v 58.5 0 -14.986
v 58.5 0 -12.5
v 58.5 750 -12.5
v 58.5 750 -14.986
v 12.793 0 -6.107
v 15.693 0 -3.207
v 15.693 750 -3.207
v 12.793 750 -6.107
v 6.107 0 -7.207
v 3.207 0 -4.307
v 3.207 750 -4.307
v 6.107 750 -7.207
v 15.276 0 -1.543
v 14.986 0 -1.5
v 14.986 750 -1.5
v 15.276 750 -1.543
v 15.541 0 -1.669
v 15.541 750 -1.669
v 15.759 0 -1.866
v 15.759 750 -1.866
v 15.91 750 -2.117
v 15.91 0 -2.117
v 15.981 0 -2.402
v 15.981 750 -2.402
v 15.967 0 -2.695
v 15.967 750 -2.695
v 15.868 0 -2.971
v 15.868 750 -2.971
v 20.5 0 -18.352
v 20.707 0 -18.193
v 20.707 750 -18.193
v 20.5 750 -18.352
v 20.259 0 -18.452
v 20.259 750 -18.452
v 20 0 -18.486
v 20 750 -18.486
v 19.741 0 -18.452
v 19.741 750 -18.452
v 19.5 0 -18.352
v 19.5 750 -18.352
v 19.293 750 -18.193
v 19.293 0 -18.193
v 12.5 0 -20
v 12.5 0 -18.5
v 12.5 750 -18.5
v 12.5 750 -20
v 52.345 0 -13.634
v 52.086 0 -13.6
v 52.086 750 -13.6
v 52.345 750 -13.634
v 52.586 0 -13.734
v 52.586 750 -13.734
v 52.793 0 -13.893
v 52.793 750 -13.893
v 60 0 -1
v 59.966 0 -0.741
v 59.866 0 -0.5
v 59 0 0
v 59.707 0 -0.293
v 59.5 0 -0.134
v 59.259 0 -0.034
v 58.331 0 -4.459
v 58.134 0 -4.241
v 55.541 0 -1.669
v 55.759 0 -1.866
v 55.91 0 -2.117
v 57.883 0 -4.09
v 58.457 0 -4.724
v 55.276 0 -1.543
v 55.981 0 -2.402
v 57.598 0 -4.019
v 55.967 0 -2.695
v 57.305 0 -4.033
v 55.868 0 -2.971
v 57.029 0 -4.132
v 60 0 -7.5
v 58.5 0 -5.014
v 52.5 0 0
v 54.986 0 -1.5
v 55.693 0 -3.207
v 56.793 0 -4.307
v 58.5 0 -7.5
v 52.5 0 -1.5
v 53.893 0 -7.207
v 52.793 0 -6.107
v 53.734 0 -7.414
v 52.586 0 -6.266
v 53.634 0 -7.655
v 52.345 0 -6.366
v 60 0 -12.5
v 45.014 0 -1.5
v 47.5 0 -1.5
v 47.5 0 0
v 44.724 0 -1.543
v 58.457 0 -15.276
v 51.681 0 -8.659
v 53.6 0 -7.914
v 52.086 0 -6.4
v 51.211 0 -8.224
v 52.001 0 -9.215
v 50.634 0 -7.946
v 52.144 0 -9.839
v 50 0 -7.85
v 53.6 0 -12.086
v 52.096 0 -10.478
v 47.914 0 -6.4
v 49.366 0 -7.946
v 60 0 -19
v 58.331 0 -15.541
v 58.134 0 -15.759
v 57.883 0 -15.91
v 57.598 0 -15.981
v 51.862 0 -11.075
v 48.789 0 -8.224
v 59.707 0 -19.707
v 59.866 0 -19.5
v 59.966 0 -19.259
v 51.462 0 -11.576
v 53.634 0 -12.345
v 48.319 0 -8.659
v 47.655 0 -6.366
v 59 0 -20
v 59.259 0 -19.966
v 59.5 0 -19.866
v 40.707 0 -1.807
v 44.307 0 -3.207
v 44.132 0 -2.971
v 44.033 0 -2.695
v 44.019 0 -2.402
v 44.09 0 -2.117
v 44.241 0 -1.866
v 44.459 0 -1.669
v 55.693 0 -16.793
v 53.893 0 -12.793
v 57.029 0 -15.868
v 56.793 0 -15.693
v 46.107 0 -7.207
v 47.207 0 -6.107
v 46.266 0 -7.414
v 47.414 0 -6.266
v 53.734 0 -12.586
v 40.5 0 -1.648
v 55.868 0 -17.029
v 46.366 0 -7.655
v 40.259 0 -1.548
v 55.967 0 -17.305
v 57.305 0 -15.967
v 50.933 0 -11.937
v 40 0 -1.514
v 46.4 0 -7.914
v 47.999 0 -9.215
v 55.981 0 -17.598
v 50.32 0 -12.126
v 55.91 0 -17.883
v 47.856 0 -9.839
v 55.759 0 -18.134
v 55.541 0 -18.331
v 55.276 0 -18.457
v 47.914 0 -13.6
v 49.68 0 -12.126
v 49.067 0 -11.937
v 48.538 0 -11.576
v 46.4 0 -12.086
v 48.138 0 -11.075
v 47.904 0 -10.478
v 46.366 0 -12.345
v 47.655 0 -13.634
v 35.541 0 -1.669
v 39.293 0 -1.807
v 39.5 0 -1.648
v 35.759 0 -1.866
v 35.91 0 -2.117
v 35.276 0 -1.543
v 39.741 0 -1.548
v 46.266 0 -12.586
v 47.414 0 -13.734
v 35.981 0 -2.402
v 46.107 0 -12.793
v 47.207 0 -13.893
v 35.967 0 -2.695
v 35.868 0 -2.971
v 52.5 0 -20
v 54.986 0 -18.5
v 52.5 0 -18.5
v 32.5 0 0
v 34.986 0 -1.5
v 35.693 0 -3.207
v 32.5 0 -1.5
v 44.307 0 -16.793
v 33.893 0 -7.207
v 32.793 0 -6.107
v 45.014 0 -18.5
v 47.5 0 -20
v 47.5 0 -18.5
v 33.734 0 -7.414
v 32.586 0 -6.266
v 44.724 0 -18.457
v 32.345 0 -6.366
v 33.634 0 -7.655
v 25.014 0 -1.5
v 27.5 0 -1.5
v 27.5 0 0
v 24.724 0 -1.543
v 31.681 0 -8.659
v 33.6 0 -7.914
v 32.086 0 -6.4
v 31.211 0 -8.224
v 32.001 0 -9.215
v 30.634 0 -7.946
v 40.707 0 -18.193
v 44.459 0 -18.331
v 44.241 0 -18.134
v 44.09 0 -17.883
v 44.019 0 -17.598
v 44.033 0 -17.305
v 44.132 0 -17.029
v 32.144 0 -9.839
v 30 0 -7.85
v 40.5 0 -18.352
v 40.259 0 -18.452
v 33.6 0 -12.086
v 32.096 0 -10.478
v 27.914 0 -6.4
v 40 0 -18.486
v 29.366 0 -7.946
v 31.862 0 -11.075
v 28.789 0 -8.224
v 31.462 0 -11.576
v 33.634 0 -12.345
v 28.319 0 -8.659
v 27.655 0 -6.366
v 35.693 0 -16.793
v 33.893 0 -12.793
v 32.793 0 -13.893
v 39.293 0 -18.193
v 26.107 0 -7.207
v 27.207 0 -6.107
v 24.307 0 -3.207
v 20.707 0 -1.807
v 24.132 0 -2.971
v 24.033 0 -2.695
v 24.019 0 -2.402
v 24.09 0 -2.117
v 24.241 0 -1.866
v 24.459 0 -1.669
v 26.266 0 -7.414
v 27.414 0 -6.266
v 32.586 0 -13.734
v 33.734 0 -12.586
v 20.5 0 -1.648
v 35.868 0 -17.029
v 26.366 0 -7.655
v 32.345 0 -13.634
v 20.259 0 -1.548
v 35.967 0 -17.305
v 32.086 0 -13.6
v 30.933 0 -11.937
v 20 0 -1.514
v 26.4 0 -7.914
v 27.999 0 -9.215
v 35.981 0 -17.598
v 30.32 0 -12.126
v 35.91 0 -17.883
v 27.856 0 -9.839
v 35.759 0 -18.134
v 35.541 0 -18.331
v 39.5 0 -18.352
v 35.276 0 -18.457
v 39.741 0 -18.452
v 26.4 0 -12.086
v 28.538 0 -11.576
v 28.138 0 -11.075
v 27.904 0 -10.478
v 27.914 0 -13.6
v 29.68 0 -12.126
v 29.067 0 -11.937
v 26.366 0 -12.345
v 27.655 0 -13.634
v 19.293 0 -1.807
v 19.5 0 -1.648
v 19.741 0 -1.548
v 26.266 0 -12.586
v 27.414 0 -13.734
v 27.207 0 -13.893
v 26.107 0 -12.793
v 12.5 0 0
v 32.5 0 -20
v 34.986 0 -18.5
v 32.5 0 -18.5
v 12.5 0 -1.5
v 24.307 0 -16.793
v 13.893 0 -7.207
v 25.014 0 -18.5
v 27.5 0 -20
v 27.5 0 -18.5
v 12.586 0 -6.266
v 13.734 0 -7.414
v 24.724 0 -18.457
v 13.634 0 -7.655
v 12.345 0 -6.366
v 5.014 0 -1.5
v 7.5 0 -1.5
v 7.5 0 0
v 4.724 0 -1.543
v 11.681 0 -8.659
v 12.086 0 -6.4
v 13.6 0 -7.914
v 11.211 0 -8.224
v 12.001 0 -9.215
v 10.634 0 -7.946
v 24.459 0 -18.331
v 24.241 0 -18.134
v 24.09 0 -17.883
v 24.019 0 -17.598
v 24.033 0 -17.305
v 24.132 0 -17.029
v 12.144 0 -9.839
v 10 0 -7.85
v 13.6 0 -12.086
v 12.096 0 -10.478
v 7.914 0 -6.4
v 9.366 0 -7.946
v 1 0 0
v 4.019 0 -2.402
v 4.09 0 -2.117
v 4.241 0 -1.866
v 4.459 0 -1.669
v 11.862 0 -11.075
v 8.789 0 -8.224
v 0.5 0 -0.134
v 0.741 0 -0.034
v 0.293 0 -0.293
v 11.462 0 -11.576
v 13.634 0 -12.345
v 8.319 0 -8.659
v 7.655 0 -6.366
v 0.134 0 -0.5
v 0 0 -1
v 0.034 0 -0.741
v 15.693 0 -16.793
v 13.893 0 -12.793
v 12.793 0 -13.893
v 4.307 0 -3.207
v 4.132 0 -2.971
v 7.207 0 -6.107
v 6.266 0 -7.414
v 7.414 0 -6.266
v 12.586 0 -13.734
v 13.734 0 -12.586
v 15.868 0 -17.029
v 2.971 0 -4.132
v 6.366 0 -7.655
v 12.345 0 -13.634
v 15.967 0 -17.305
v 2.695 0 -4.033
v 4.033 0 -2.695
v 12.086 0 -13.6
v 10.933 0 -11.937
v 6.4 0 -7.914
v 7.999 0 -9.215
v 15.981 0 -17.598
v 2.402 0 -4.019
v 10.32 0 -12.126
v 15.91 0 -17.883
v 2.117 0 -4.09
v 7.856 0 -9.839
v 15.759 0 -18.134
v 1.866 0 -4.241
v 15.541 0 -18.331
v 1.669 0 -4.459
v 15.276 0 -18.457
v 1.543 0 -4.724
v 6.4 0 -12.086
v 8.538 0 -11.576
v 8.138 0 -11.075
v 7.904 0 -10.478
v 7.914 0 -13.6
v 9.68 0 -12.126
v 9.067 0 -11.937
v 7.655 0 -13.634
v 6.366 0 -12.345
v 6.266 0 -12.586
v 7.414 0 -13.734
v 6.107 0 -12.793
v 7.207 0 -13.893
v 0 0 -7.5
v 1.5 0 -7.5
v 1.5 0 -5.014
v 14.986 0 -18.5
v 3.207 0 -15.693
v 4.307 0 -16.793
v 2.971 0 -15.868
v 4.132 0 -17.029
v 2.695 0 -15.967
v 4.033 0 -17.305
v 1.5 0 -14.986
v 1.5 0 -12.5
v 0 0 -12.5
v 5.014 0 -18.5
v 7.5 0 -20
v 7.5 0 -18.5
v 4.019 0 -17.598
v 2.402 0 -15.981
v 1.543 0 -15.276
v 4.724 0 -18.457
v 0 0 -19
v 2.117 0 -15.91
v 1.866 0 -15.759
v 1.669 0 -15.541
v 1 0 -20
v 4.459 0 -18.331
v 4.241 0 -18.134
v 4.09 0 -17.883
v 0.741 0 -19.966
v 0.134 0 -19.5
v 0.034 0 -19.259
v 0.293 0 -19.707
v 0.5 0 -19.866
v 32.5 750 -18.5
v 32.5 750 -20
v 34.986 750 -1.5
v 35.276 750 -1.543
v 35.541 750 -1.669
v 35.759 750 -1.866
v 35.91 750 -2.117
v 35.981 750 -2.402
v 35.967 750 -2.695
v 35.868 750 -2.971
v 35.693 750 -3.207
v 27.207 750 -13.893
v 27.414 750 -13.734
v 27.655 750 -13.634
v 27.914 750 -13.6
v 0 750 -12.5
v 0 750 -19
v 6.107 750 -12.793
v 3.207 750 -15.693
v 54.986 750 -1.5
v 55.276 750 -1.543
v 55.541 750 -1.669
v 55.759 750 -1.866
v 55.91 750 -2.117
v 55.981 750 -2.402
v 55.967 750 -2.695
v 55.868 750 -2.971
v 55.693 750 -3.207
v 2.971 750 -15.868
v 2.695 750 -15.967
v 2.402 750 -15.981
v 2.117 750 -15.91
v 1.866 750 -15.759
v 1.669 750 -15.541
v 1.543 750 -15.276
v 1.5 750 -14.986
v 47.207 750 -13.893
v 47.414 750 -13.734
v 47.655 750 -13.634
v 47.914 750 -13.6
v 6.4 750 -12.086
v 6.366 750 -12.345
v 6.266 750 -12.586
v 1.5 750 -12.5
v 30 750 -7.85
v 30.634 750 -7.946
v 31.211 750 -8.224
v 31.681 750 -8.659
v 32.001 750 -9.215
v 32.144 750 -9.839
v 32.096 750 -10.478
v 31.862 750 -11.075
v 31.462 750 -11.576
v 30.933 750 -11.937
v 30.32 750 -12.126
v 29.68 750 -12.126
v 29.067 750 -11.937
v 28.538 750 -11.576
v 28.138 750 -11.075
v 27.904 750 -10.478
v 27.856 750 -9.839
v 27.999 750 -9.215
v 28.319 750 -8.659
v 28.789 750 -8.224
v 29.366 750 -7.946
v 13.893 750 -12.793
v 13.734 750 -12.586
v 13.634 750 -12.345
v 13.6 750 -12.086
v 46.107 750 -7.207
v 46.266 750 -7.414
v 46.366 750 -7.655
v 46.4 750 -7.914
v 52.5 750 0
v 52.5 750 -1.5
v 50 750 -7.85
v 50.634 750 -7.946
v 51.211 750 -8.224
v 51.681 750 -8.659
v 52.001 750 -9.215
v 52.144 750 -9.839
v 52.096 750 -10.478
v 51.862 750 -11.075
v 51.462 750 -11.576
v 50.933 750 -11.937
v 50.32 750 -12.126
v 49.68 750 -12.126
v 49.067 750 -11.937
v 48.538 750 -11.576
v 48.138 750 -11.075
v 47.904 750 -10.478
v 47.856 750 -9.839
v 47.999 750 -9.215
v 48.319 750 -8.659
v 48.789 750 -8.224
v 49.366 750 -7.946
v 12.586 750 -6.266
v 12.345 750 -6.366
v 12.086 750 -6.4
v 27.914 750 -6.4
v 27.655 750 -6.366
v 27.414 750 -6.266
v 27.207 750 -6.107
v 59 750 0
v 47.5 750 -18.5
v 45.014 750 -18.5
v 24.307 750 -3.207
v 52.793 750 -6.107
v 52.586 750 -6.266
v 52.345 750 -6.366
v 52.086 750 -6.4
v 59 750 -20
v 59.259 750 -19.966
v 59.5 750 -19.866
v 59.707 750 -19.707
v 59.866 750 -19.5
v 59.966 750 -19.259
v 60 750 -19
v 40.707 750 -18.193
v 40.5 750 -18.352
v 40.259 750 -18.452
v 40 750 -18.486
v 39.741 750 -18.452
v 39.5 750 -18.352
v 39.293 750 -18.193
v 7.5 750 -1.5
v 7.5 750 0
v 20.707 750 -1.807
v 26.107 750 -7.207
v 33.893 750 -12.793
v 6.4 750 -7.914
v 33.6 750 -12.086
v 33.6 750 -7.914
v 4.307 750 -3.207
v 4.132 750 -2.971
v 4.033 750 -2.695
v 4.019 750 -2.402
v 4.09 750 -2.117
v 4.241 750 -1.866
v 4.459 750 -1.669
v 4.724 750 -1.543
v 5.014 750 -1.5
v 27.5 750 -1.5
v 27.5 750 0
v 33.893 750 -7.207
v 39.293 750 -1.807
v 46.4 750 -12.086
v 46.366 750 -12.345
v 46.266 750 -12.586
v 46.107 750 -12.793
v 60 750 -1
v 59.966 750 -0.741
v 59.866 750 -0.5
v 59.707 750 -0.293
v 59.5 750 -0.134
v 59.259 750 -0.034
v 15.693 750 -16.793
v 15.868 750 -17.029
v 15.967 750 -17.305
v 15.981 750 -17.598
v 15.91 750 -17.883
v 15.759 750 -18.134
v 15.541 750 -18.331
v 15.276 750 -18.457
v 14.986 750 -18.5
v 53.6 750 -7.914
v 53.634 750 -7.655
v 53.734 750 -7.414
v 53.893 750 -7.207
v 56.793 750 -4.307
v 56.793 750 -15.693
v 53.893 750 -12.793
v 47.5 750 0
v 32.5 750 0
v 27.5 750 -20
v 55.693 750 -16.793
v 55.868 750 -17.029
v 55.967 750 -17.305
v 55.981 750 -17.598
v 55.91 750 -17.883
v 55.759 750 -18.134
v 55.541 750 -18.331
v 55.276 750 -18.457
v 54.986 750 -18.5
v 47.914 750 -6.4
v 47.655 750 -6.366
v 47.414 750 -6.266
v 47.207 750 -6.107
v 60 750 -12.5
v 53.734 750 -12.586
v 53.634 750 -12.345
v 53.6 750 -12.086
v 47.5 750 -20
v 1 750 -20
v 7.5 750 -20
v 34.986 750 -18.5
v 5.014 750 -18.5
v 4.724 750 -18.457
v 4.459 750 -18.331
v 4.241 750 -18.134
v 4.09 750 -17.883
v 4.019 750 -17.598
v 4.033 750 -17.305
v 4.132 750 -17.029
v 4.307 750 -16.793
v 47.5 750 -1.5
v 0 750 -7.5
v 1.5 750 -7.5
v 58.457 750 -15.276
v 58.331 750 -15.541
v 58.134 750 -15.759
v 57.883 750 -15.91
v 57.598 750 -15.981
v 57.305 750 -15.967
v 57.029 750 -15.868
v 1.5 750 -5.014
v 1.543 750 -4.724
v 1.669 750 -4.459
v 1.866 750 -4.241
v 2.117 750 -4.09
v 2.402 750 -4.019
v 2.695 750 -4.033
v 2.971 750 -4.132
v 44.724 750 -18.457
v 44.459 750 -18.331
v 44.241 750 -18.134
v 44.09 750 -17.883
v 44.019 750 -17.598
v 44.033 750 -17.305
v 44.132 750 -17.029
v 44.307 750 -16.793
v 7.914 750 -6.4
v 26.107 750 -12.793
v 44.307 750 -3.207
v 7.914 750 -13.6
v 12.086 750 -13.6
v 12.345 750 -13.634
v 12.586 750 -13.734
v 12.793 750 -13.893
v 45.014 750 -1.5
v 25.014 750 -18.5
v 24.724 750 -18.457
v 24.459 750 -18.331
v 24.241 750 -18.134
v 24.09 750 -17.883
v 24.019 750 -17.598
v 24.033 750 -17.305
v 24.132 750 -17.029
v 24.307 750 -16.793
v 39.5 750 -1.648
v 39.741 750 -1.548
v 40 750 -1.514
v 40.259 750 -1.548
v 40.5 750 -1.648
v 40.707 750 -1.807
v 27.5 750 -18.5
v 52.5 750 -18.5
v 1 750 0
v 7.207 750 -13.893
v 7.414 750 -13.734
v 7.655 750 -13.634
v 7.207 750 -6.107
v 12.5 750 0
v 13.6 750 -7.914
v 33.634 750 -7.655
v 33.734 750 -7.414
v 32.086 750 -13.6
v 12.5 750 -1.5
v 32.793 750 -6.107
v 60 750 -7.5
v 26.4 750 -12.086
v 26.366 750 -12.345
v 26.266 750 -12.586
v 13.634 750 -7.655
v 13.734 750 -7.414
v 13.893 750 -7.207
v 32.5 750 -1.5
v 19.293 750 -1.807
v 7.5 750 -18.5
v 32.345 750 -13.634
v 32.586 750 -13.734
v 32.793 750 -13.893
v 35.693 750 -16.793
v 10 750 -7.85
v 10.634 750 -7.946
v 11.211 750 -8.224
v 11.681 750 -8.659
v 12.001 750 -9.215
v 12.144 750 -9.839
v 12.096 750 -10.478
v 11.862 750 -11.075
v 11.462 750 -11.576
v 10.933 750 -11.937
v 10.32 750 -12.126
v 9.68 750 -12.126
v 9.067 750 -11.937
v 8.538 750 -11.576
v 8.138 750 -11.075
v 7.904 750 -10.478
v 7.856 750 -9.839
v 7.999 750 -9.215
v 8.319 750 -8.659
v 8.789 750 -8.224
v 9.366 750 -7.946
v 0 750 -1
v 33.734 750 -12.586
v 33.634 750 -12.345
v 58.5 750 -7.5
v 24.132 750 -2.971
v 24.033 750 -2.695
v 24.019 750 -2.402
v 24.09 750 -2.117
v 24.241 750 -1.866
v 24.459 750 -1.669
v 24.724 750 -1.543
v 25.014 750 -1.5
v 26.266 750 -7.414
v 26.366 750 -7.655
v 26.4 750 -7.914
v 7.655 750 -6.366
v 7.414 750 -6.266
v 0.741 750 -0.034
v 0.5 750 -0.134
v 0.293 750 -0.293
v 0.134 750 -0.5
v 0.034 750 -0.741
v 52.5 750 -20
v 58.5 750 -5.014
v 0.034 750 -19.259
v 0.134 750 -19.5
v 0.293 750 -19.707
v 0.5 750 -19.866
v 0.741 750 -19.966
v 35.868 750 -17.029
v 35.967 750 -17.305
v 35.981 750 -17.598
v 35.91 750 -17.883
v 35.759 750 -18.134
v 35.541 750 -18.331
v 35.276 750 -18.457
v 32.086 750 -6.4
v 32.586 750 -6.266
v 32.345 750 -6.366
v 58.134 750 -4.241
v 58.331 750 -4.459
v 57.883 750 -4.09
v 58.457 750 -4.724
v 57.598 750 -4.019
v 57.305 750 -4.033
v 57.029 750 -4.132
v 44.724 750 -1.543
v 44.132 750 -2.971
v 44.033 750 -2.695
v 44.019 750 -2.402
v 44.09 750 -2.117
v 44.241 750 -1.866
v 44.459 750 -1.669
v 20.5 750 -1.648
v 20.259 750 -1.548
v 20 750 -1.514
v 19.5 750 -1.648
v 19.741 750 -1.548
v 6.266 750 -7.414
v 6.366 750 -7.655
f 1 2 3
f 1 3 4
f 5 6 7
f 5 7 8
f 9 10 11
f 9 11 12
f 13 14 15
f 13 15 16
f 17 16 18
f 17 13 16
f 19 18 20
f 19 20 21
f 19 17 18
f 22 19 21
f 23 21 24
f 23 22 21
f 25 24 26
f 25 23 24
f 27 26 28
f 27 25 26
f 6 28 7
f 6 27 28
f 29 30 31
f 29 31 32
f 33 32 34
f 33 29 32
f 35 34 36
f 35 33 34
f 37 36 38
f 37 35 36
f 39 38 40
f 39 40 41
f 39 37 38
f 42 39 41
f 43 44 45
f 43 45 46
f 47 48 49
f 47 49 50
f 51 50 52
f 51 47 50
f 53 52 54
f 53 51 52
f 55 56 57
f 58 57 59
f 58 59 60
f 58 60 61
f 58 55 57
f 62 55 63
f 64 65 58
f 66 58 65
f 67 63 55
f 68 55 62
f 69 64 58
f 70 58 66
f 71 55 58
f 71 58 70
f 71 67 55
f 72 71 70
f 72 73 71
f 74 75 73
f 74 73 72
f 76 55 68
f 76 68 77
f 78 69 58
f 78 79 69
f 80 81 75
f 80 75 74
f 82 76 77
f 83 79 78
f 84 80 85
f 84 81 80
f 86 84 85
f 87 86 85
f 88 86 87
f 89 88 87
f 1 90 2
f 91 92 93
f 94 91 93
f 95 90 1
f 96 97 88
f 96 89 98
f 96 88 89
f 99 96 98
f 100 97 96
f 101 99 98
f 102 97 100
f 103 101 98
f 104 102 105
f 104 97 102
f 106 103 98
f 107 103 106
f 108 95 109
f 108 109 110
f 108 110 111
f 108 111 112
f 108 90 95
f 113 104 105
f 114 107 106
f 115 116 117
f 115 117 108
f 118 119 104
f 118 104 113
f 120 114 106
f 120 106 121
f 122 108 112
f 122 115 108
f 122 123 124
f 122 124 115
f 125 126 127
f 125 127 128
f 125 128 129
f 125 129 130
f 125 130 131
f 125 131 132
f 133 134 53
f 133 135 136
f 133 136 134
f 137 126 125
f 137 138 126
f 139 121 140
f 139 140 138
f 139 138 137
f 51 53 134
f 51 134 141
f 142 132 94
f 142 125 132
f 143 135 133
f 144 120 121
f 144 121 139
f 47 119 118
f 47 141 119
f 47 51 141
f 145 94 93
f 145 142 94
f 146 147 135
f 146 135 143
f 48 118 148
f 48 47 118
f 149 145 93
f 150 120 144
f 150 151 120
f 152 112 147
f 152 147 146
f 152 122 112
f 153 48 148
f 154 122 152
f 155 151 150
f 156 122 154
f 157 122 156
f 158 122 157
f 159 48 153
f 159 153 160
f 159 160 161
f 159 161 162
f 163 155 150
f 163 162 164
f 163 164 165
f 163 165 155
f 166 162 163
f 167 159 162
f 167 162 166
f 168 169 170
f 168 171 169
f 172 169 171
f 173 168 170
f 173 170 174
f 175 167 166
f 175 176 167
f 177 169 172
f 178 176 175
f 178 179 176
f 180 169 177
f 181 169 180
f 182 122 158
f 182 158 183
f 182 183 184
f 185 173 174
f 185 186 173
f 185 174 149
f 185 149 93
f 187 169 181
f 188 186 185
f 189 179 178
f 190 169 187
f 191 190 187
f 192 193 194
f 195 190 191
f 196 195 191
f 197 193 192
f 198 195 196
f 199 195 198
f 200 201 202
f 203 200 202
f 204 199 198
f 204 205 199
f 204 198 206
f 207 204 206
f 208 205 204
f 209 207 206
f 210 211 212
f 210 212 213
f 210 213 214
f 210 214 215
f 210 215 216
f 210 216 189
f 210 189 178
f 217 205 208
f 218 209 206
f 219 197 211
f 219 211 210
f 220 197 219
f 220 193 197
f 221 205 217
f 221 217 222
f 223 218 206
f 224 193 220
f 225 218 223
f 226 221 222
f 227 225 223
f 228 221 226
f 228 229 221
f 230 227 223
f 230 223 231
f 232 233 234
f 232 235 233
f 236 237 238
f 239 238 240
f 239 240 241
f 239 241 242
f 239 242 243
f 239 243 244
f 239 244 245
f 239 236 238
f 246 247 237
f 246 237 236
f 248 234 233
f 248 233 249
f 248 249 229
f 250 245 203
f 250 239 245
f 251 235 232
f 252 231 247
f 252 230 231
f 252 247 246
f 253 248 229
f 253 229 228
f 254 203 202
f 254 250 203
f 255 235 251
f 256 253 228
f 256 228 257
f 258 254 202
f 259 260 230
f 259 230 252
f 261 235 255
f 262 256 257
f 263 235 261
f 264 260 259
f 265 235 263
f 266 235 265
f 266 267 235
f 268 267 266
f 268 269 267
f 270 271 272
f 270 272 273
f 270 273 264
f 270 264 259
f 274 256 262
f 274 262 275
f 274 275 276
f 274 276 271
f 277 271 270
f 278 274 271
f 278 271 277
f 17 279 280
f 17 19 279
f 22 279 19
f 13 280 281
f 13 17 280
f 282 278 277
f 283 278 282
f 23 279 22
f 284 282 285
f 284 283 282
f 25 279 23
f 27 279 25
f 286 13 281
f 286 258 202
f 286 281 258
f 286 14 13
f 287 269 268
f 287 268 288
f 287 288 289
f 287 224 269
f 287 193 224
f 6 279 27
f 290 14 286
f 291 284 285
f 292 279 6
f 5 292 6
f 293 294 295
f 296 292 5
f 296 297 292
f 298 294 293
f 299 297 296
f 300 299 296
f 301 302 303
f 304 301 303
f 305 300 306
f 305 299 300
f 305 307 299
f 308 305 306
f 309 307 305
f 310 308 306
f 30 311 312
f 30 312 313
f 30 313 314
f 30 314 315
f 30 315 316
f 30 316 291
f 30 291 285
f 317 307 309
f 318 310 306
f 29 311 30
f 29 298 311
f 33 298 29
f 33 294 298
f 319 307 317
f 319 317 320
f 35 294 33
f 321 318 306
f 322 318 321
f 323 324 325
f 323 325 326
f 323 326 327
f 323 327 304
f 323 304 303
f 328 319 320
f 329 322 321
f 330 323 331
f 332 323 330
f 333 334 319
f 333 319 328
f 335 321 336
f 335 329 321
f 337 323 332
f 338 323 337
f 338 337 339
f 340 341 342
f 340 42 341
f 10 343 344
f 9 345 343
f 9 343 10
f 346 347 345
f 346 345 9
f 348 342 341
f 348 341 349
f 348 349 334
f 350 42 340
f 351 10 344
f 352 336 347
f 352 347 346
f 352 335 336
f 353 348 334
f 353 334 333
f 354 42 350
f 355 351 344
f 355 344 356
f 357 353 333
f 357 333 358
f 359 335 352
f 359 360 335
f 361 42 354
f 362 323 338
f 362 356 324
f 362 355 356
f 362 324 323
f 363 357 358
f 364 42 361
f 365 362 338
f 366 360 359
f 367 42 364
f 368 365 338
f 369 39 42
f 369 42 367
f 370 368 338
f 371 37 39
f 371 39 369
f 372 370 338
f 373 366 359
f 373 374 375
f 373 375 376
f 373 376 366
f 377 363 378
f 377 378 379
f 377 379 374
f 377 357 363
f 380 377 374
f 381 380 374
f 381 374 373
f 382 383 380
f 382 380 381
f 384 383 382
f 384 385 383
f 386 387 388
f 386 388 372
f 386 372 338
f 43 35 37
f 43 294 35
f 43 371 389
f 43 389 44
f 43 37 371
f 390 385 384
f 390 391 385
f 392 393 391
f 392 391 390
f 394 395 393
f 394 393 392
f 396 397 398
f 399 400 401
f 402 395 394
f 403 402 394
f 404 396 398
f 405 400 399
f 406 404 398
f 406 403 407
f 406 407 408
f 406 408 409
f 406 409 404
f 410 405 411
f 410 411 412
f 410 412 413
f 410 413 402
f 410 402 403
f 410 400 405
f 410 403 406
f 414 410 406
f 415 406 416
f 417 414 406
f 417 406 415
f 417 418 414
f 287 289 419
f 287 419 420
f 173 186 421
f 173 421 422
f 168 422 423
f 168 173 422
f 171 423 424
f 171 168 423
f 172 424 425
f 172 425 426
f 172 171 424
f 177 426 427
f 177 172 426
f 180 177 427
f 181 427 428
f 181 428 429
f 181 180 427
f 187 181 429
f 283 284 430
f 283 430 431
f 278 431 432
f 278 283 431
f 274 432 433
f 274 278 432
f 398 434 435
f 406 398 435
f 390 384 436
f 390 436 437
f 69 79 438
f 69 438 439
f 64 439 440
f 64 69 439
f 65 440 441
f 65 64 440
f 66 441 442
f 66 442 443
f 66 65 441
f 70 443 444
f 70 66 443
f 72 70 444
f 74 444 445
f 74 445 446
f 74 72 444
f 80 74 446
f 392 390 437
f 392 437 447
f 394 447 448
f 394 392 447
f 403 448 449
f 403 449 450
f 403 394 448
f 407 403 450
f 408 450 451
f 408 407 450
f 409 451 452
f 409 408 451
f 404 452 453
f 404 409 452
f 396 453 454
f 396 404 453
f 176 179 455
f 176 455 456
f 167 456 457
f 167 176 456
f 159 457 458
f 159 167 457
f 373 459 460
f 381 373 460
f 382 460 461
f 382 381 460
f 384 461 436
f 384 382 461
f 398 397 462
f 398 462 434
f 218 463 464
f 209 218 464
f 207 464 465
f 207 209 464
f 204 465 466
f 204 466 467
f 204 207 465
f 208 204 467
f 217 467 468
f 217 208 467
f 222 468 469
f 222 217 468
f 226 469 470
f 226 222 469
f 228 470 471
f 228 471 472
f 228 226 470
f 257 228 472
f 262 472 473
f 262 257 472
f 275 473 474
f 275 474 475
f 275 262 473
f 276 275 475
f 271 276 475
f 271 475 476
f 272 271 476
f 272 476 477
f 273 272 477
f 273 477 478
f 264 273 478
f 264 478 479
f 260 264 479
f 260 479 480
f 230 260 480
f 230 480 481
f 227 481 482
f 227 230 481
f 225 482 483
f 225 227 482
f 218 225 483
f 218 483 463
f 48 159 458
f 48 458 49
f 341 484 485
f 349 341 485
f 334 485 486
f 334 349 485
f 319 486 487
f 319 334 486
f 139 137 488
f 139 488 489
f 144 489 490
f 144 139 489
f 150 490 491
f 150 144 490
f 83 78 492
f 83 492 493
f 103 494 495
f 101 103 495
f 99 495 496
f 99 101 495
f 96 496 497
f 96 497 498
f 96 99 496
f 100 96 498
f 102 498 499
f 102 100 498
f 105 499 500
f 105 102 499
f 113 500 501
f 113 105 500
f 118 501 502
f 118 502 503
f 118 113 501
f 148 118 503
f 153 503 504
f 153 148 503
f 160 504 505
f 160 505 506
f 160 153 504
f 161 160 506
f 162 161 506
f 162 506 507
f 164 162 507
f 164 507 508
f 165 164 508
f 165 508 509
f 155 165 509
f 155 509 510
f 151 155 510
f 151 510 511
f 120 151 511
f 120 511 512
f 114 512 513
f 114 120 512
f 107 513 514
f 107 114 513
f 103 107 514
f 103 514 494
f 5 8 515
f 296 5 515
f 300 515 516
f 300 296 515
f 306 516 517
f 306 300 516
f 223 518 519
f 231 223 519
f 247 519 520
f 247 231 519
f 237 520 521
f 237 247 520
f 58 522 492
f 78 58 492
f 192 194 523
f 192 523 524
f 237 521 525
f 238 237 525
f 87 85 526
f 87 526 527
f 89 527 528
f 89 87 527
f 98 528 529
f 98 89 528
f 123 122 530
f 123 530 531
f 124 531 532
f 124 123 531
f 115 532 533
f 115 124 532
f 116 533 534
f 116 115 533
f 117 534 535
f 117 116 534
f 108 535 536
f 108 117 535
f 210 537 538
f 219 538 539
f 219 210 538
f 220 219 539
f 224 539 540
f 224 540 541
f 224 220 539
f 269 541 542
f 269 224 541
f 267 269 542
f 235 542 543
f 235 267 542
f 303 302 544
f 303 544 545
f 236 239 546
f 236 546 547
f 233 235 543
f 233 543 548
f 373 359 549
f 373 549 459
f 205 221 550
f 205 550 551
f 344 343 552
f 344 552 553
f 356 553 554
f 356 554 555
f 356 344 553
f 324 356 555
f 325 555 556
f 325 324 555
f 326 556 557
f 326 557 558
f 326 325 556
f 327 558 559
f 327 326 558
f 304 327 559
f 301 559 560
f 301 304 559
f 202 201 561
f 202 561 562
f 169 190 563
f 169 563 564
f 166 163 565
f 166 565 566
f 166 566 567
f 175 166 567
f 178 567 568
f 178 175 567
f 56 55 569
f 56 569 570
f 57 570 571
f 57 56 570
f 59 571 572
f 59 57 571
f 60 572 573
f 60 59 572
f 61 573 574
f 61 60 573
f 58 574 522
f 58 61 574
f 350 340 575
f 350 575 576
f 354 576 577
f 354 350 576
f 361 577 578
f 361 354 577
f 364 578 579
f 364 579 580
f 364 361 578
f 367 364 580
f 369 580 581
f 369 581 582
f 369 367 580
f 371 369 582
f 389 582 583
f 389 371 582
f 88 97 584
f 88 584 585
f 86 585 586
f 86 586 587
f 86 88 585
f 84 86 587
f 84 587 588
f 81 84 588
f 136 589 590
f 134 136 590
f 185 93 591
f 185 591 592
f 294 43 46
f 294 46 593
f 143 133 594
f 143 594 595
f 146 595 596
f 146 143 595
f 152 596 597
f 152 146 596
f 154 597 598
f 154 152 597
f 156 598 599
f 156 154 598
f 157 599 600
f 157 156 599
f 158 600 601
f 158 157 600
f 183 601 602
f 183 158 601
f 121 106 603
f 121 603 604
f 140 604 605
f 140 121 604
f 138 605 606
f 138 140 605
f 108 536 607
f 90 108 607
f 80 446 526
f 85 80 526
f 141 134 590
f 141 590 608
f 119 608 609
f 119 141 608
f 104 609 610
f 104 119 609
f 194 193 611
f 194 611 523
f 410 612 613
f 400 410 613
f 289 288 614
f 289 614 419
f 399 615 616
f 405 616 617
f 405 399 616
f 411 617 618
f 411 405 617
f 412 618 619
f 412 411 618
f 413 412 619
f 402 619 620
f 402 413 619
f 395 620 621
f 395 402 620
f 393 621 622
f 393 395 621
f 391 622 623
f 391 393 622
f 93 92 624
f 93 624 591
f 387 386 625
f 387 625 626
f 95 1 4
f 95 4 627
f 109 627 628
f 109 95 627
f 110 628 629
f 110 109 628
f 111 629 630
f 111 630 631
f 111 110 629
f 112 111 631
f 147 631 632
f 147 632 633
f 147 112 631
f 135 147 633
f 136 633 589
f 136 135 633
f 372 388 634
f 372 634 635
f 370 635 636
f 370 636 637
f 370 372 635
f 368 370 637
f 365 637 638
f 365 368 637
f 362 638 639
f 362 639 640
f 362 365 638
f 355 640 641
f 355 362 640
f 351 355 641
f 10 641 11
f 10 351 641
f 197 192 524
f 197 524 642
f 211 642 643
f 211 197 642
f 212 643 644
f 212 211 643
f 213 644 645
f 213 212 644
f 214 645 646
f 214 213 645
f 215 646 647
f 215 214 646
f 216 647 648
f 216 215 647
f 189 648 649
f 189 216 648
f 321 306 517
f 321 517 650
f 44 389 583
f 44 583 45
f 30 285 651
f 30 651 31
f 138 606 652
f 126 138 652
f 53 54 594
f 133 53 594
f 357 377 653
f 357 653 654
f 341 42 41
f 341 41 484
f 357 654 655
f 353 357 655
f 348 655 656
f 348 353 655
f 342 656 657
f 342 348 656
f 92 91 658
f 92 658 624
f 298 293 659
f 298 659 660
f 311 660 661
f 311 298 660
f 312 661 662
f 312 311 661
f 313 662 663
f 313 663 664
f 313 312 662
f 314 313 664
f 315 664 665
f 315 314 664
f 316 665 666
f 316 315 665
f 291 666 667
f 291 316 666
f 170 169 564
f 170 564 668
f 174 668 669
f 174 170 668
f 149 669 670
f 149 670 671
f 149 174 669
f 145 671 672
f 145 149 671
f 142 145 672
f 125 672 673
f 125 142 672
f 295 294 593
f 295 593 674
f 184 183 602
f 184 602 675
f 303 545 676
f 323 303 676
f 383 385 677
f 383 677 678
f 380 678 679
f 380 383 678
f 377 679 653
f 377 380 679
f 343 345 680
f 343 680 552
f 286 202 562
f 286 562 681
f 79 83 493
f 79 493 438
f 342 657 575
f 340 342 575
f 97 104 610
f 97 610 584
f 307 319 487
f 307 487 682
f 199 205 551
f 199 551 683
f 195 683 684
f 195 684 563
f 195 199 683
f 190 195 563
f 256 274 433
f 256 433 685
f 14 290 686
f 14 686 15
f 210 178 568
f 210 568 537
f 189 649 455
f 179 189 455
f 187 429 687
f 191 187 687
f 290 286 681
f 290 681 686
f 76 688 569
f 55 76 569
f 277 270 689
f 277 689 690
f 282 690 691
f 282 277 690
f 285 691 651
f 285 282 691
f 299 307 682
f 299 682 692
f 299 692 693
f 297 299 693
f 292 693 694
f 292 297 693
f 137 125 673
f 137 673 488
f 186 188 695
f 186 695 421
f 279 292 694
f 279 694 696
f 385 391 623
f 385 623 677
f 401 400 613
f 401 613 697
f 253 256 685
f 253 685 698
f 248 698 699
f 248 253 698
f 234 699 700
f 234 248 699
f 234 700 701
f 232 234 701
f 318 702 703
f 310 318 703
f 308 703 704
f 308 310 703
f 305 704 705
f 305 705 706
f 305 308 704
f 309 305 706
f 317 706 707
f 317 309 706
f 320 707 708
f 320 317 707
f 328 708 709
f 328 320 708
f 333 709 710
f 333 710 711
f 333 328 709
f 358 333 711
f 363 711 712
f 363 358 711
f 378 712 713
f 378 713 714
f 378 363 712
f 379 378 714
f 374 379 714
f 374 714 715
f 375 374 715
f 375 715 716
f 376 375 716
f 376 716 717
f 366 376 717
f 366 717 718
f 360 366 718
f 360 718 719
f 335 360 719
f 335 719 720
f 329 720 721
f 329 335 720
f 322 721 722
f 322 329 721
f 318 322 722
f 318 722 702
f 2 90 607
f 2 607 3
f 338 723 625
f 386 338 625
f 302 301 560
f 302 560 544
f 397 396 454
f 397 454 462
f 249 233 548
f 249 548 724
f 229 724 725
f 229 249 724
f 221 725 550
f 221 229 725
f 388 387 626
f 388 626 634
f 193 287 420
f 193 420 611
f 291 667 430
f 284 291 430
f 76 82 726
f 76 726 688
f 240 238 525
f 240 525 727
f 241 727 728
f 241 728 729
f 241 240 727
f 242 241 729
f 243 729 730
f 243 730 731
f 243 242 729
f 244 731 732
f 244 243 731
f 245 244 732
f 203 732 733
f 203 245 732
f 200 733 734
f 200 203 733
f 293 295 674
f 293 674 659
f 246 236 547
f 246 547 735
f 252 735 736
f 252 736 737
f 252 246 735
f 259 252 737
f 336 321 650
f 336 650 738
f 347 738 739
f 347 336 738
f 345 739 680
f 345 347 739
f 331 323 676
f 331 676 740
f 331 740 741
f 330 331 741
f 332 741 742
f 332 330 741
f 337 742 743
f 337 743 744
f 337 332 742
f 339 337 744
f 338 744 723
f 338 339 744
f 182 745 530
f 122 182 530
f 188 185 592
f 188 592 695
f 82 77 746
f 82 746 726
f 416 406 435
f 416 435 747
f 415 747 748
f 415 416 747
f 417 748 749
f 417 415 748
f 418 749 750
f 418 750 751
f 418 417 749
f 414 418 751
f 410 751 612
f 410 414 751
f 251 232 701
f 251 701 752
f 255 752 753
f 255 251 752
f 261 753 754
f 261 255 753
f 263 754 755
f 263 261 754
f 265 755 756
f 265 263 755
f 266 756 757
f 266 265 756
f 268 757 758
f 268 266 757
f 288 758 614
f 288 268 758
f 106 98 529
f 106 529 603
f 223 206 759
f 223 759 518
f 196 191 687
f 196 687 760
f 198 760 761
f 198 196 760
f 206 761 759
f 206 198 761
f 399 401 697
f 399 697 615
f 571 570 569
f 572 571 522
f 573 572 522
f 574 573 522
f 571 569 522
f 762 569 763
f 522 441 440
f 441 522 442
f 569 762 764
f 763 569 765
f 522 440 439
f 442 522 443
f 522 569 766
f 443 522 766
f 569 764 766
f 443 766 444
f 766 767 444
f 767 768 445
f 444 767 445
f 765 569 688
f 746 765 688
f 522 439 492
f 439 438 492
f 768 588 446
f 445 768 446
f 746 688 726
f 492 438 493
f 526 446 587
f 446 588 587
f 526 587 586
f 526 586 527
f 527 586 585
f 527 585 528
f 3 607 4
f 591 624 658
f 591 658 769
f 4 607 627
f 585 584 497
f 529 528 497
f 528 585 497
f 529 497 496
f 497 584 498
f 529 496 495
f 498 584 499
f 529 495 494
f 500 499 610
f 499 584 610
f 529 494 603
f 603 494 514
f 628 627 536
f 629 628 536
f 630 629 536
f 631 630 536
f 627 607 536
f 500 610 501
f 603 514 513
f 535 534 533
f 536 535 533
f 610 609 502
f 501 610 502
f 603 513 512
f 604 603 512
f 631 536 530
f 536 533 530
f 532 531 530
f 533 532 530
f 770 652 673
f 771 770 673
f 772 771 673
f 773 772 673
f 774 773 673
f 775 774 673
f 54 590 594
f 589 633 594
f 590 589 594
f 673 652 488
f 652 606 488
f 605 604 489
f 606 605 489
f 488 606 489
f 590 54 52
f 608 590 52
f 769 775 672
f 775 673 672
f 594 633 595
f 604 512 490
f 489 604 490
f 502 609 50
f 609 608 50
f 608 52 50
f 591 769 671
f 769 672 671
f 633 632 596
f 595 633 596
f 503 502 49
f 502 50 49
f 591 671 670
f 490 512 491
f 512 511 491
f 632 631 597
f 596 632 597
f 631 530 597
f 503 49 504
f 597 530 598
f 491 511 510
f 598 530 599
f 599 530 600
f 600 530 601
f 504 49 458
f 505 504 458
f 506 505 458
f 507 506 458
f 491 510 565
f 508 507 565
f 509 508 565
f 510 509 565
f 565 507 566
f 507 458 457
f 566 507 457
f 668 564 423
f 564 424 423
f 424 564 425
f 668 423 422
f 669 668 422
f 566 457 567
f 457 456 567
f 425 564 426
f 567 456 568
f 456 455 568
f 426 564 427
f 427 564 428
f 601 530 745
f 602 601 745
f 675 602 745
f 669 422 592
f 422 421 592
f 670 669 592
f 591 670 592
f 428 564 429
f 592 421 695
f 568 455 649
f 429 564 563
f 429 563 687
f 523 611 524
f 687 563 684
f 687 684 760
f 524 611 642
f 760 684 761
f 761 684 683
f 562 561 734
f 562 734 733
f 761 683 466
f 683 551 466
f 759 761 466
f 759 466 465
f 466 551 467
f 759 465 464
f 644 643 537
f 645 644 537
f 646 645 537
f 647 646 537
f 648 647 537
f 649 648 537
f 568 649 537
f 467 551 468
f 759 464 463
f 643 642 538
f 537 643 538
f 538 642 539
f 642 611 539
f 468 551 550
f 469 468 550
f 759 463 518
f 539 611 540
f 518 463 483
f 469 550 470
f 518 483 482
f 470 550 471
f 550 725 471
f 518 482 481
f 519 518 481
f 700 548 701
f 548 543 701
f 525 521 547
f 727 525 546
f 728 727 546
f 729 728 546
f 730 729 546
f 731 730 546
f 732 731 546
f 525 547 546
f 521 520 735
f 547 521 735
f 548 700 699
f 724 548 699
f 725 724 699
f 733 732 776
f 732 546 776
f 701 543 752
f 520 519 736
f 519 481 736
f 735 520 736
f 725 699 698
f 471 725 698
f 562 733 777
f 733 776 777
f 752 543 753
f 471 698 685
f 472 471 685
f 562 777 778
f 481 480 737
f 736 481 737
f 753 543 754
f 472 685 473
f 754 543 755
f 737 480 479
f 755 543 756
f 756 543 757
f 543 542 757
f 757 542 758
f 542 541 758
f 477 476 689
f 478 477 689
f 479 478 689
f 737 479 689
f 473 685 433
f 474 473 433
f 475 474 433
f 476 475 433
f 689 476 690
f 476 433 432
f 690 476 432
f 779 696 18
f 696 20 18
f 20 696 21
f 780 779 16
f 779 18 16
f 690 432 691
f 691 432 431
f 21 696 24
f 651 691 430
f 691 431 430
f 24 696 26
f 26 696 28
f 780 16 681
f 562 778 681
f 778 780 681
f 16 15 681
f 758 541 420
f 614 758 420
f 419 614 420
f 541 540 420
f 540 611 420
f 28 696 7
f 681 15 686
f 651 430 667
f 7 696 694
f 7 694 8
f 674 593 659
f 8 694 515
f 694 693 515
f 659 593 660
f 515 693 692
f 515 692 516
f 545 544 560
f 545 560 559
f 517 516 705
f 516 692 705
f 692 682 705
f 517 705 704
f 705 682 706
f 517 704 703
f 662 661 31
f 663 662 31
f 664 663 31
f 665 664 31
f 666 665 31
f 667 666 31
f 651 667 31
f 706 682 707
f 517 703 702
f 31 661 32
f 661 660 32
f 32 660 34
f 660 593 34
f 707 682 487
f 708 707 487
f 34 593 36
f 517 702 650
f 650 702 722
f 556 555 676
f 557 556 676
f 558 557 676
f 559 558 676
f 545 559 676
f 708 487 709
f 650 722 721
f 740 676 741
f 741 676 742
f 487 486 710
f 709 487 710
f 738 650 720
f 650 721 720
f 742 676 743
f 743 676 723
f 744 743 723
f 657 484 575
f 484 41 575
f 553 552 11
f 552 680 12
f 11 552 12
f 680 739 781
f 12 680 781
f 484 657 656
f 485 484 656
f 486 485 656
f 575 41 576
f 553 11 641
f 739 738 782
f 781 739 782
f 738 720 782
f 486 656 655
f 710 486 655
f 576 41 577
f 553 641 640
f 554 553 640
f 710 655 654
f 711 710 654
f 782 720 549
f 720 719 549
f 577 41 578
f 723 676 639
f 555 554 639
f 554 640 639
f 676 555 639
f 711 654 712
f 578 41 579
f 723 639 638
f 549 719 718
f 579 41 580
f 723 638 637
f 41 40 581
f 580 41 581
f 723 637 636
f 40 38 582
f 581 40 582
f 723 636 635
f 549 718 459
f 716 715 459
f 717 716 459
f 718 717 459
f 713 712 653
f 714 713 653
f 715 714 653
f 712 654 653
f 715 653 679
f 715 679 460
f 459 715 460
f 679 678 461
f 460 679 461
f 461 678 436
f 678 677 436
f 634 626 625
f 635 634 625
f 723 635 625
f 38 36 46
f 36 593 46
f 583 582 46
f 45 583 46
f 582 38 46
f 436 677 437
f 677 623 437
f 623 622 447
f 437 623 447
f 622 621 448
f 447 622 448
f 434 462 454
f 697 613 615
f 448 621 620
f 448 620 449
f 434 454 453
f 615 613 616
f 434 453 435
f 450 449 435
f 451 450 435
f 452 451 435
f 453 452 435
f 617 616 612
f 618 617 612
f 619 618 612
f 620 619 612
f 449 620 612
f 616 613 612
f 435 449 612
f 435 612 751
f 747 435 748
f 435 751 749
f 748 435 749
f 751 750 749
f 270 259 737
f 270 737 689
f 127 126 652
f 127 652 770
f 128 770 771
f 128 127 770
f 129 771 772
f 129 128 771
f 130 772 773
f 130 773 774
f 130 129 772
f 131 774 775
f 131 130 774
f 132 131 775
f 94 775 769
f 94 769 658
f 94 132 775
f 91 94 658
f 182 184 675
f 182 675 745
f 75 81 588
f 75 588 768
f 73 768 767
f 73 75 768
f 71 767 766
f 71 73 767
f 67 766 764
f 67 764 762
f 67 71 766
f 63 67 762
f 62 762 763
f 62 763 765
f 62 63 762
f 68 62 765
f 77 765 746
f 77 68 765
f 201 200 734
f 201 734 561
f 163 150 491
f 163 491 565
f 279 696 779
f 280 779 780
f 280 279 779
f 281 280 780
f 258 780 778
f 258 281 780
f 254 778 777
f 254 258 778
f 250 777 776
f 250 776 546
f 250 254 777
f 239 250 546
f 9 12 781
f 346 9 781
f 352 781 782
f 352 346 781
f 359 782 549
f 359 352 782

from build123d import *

# Parameters (mm, degrees)
SKETCH1_R           = 2.15
BOSS_EXTRUDE1_DEPTH = 750


with BuildPart() as part:
    # Sketch1 → Boss-Extrude1 (new body)
    with BuildSketch(Plane(origin=(0, 0, 0), x_dir=(1, 0, 0), z_dir=(0, 1, 0))):
        with BuildLine():
            Line((7.5, 20), (7.5, 18.5))
            Line((7.5, 18.5), (5.014213562, 18.5))
            ThreePointArc((5.014213562, 18.5), (4.09033403, 17.882683432), (4.307106781, 16.792893219))
            Line((4.307106781, 16.792893219), (7.207106781, 13.892893219))
            ThreePointArc((7.207106781, 13.892893219), (7.53153013, 13.676120467), (7.914213562, 13.6))
            Line((7.914213562, 13.6), (12.085786438, 13.6))
            ThreePointArc((12.085786438, 13.6), (12.46846987, 13.676120467), (12.792893219, 13.892893219))
            Line((12.792893219, 13.892893219), (15.692893219, 16.792893219))
            ThreePointArc((15.692893219, 16.792893219), (15.90966597, 17.882683432), (14.985786438, 18.5))
            Line((14.985786438, 18.5), (12.5, 18.5))
            Line((12.5, 18.5), (12.5, 20))
            Line((12.5, 20), (27.5, 20))
            Line((27.5, 20), (27.5, 18.5))
            Line((27.5, 18.5), (25.014213562, 18.5))
            ThreePointArc((25.014213562, 18.5), (24.09033403, 17.882683432), (24.307106781, 16.792893219))
            Line((24.307106781, 16.792893219), (27.207106781, 13.892893219))
            ThreePointArc((27.207106781, 13.892893219), (27.53153013, 13.676120467), (27.914213562, 13.6))
            Line((27.914213562, 13.6), (32.085786438, 13.6))
            ThreePointArc((32.085786438, 13.6), (32.46846987, 13.676120467), (32.792893219, 13.892893219))
            Line((32.792893219, 13.892893219), (35.692893219, 16.792893219))
            ThreePointArc((35.692893219, 16.792893219), (35.90966597, 17.882683432), (34.985786438, 18.5))
            Line((34.985786438, 18.5), (32.5, 18.5))
            Line((32.5, 18.5), (32.5, 20))
            Line((32.5, 20), (47.5, 20))
            Line((47.5, 20), (47.5, 18.5))
            Line((47.5, 18.5), (45.014213562, 18.5))
            ThreePointArc((45.014213562, 18.5), (44.09033403, 17.882683432), (44.307106781, 16.792893219))
            Line((44.307106781, 16.792893219), (47.207106781, 13.892893219))
            ThreePointArc((47.207106781, 13.892893219), (47.53153013, 13.676120467), (47.914213562, 13.6))
            Line((47.914213562, 13.6), (52.085786438, 13.6))
            ThreePointArc((52.085786438, 13.6), (52.46846987, 13.676120467), (52.792893219, 13.892893219))
            Line((52.792893219, 13.892893219), (55.692893219, 16.792893219))
            ThreePointArc((55.692893219, 16.792893219), (55.90966597, 17.882683432), (54.985786438, 18.5))
            Line((54.985786438, 18.5), (52.5, 18.5))
            Line((52.5, 18.5), (52.5, 20))
            Line((52.5, 20), (59, 20))
            ThreePointArc((59, 20), (59.707106781, 19.707106781), (60, 19))
            Line((60, 19), (60, 12.5))
            Line((60, 12.5), (58.5, 12.5))
            Line((58.5, 12.5), (58.5, 14.985786438))
            ThreePointArc((58.5, 14.985786438), (57.882683432, 15.90966597), (56.792893219, 15.692893219))
            Line((56.792893219, 15.692893219), (53.892893219, 12.792893219))
            ThreePointArc((53.892893219, 12.792893219), (53.676120467, 12.46846987), (53.6, 12.085786438))
            Line((53.6, 12.085786438), (53.6, 7.914213562))
            ThreePointArc((53.6, 7.914213562), (53.676120467, 7.53153013), (53.892893219, 7.207106781))
            Line((53.892893219, 7.207106781), (56.792893219, 4.307106781))
            ThreePointArc((56.792893219, 4.307106781), (57.882683432, 4.09033403), (58.5, 5.014213562))
            Line((58.5, 5.014213562), (58.5, 7.5))
            Line((58.5, 7.5), (60, 7.5))
            Line((60, 7.5), (60, 1))
            ThreePointArc((60, 1), (59.707106781, 0.292893219), (59, 0))
            Line((59, 0), (52.5, 0))
            Line((52.5, 0), (52.5, 1.5))
            Line((52.5, 1.5), (54.985786438, 1.5))
            ThreePointArc((54.985786438, 1.5), (55.90966597, 2.117316568), (55.692893219, 3.207106781))
            Line((55.692893219, 3.207106781), (52.792893219, 6.107106781))
            ThreePointArc((52.792893219, 6.107106781), (52.46846987, 6.323879533), (52.085786438, 6.4))
            Line((52.085786438, 6.4), (47.914213562, 6.4))
            ThreePointArc((47.914213562, 6.4), (47.53153013, 6.323879533), (47.207106781, 6.107106781))
            Line((47.207106781, 6.107106781), (44.307106781, 3.207106781))
            ThreePointArc((44.307106781, 3.207106781), (44.09033403, 2.117316568), (45.014213562, 1.5))
            Line((45.014213562, 1.5), (47.5, 1.5))
            Line((47.5, 1.5), (47.5, 0))
            Line((47.5, 0), (32.5, 0))
            Line((32.5, 0), (32.5, 1.5))
            Line((32.5, 1.5), (34.985786438, 1.5))
            ThreePointArc((34.985786438, 1.5), (35.90966597, 2.117316568), (35.692893219, 3.207106781))
            Line((35.692893219, 3.207106781), (32.792893219, 6.107106781))
            ThreePointArc((32.792893219, 6.107106781), (32.46846987, 6.323879533), (32.085786438, 6.4))
            Line((32.085786438, 6.4), (27.914213562, 6.4))
            ThreePointArc((27.914213562, 6.4), (27.53153013, 6.323879533), (27.207106781, 6.107106781))
            Line((27.207106781, 6.107106781), (24.307106781, 3.207106781))
            ThreePointArc((24.307106781, 3.207106781), (24.09033403, 2.117316568), (25.014213562, 1.5))
            Line((25.014213562, 1.5), (27.5, 1.5))
            Line((27.5, 1.5), (27.5, 0))
            Line((27.5, 0), (12.5, 0))
            Line((12.5, 0), (12.5, 1.5))
            Line((12.5, 1.5), (14.985786438, 1.5))
            ThreePointArc((14.985786438, 1.5), (15.90966597, 2.117316568), (15.692893219, 3.207106781))
            Line((15.692893219, 3.207106781), (12.792893219, 6.107106781))
            ThreePointArc((12.792893219, 6.107106781), (12.46846987, 6.323879533), (12.085786438, 6.4))
            Line((12.085786438, 6.4), (7.914213562, 6.4))
            ThreePointArc((7.914213562, 6.4), (7.53153013, 6.323879533), (7.207106781, 6.107106781))
            Line((7.207106781, 6.107106781), (4.307106781, 3.207106781))
            ThreePointArc((4.307106781, 3.207106781), (4.09033403, 2.117316568), (5.014213562, 1.5))
            Line((5.014213562, 1.5), (7.5, 1.5))
            Line((7.5, 1.5), (7.5, 0))
            Line((7.5, 0), (1, 0))
            ThreePointArc((1, 0), (0.292893219, 0.292893219), (0, 1))
            Line((0, 1), (0, 7.5))
            Line((0, 7.5), (1.5, 7.5))
            Line((1.5, 7.5), (1.5, 5.014213562))
            ThreePointArc((1.5, 5.014213562), (2.117316568, 4.09033403), (3.207106781, 4.307106781))
            Line((3.207106781, 4.307106781), (6.107106781, 7.207106781))
            ThreePointArc((6.107106781, 7.207106781), (6.323879533, 7.53153013), (6.4, 7.914213562))
            Line((6.4, 7.914213562), (6.4, 12.085786438))
            ThreePointArc((6.4, 12.085786438), (6.323879533, 12.46846987), (6.107106781, 12.792893219))
            Line((6.107106781, 12.792893219), (3.207106781, 15.692893219))
            ThreePointArc((3.207106781, 15.692893219), (2.117316568, 15.90966597), (1.5, 14.985786438))
            Line((1.5, 14.985786438), (1.5, 12.5))
            Line((1.5, 12.5), (0, 12.5))
            Line((0, 12.5), (0, 19))
            ThreePointArc((0, 19), (0.292893219, 19.707106781), (1, 20))
            Line((1, 20), (7.5, 20))
        make_face()
        with Locations(Location((10, 10, 0), (0, 0, 270))):
            Circle(SKETCH1_R, mode=Mode.SUBTRACT)
        with Locations(Location((30, 10, 0), (0, 0, 270))):
            Circle(SKETCH1_R, mode=Mode.SUBTRACT)
        with Locations(Location((50, 10, 0), (0, 0, 270))):
            Circle(SKETCH1_R, mode=Mode.SUBTRACT)
        with BuildLine():
            Line((19.292893219, 18.192893219), (13.892893219, 12.792893219))
            ThreePointArc((13.892893219, 12.792893219), (13.676120467, 12.46846987), (13.6, 12.085786438))
            Line((13.6, 12.085786438), (13.6, 7.914213562))
            ThreePointArc((13.6, 7.914213562), (13.676120467, 7.53153013), (13.892893219, 7.207106781))
            Line((13.892893219, 7.207106781), (19.292893219, 1.807106781))
            ThreePointArc((19.292893219, 1.807106781), (20, 1.514213562), (20.707106781, 1.807106781))
            Line((20.707106781, 1.807106781), (26.107106781, 7.207106781))
            ThreePointArc((26.107106781, 7.207106781), (26.323879533, 7.53153013), (26.4, 7.914213562))
            Line((26.4, 7.914213562), (26.4, 12.085786438))
            ThreePointArc((26.4, 12.085786438), (26.323879533, 12.46846987), (26.107106781, 12.792893219))
            Line((26.107106781, 12.792893219), (20.707106781, 18.192893219))
            ThreePointArc((20.707106781, 18.192893219), (20, 18.485786438), (19.292893219, 18.192893219))
        make_face(mode=Mode.SUBTRACT)
        with BuildLine():
            Line((33.6, 12.085786438), (33.6, 7.914213562))
            ThreePointArc((33.6, 7.914213562), (33.676120467, 7.53153013), (33.892893219, 7.207106781))
            Line((33.892893219, 7.207106781), (39.292893219, 1.807106781))
            ThreePointArc((39.292893219, 1.807106781), (40, 1.514213562), (40.707106781, 1.807106781))
            Line((40.707106781, 1.807106781), (46.107106781, 7.207106781))
            ThreePointArc((46.107106781, 7.207106781), (46.323879533, 7.53153013), (46.4, 7.914213562))
            Line((46.4, 7.914213562), (46.4, 12.085786438))
            ThreePointArc((46.4, 12.085786438), (46.323879533, 12.46846987), (46.107106781, 12.792893219))
            Line((46.107106781, 12.792893219), (40.707106781, 18.192893219))
            ThreePointArc((40.707106781, 18.192893219), (40, 18.485786438), (39.292893219, 18.192893219))
            Line((39.292893219, 18.192893219), (33.892893219, 12.792893219))
            ThreePointArc((33.892893219, 12.792893219), (33.676120467, 12.46846987), (33.6, 12.085786438))
        make_face(mode=Mode.SUBTRACT)
    extrude(amount=BOSS_EXTRUDE1_DEPTH)


solid = part.part
